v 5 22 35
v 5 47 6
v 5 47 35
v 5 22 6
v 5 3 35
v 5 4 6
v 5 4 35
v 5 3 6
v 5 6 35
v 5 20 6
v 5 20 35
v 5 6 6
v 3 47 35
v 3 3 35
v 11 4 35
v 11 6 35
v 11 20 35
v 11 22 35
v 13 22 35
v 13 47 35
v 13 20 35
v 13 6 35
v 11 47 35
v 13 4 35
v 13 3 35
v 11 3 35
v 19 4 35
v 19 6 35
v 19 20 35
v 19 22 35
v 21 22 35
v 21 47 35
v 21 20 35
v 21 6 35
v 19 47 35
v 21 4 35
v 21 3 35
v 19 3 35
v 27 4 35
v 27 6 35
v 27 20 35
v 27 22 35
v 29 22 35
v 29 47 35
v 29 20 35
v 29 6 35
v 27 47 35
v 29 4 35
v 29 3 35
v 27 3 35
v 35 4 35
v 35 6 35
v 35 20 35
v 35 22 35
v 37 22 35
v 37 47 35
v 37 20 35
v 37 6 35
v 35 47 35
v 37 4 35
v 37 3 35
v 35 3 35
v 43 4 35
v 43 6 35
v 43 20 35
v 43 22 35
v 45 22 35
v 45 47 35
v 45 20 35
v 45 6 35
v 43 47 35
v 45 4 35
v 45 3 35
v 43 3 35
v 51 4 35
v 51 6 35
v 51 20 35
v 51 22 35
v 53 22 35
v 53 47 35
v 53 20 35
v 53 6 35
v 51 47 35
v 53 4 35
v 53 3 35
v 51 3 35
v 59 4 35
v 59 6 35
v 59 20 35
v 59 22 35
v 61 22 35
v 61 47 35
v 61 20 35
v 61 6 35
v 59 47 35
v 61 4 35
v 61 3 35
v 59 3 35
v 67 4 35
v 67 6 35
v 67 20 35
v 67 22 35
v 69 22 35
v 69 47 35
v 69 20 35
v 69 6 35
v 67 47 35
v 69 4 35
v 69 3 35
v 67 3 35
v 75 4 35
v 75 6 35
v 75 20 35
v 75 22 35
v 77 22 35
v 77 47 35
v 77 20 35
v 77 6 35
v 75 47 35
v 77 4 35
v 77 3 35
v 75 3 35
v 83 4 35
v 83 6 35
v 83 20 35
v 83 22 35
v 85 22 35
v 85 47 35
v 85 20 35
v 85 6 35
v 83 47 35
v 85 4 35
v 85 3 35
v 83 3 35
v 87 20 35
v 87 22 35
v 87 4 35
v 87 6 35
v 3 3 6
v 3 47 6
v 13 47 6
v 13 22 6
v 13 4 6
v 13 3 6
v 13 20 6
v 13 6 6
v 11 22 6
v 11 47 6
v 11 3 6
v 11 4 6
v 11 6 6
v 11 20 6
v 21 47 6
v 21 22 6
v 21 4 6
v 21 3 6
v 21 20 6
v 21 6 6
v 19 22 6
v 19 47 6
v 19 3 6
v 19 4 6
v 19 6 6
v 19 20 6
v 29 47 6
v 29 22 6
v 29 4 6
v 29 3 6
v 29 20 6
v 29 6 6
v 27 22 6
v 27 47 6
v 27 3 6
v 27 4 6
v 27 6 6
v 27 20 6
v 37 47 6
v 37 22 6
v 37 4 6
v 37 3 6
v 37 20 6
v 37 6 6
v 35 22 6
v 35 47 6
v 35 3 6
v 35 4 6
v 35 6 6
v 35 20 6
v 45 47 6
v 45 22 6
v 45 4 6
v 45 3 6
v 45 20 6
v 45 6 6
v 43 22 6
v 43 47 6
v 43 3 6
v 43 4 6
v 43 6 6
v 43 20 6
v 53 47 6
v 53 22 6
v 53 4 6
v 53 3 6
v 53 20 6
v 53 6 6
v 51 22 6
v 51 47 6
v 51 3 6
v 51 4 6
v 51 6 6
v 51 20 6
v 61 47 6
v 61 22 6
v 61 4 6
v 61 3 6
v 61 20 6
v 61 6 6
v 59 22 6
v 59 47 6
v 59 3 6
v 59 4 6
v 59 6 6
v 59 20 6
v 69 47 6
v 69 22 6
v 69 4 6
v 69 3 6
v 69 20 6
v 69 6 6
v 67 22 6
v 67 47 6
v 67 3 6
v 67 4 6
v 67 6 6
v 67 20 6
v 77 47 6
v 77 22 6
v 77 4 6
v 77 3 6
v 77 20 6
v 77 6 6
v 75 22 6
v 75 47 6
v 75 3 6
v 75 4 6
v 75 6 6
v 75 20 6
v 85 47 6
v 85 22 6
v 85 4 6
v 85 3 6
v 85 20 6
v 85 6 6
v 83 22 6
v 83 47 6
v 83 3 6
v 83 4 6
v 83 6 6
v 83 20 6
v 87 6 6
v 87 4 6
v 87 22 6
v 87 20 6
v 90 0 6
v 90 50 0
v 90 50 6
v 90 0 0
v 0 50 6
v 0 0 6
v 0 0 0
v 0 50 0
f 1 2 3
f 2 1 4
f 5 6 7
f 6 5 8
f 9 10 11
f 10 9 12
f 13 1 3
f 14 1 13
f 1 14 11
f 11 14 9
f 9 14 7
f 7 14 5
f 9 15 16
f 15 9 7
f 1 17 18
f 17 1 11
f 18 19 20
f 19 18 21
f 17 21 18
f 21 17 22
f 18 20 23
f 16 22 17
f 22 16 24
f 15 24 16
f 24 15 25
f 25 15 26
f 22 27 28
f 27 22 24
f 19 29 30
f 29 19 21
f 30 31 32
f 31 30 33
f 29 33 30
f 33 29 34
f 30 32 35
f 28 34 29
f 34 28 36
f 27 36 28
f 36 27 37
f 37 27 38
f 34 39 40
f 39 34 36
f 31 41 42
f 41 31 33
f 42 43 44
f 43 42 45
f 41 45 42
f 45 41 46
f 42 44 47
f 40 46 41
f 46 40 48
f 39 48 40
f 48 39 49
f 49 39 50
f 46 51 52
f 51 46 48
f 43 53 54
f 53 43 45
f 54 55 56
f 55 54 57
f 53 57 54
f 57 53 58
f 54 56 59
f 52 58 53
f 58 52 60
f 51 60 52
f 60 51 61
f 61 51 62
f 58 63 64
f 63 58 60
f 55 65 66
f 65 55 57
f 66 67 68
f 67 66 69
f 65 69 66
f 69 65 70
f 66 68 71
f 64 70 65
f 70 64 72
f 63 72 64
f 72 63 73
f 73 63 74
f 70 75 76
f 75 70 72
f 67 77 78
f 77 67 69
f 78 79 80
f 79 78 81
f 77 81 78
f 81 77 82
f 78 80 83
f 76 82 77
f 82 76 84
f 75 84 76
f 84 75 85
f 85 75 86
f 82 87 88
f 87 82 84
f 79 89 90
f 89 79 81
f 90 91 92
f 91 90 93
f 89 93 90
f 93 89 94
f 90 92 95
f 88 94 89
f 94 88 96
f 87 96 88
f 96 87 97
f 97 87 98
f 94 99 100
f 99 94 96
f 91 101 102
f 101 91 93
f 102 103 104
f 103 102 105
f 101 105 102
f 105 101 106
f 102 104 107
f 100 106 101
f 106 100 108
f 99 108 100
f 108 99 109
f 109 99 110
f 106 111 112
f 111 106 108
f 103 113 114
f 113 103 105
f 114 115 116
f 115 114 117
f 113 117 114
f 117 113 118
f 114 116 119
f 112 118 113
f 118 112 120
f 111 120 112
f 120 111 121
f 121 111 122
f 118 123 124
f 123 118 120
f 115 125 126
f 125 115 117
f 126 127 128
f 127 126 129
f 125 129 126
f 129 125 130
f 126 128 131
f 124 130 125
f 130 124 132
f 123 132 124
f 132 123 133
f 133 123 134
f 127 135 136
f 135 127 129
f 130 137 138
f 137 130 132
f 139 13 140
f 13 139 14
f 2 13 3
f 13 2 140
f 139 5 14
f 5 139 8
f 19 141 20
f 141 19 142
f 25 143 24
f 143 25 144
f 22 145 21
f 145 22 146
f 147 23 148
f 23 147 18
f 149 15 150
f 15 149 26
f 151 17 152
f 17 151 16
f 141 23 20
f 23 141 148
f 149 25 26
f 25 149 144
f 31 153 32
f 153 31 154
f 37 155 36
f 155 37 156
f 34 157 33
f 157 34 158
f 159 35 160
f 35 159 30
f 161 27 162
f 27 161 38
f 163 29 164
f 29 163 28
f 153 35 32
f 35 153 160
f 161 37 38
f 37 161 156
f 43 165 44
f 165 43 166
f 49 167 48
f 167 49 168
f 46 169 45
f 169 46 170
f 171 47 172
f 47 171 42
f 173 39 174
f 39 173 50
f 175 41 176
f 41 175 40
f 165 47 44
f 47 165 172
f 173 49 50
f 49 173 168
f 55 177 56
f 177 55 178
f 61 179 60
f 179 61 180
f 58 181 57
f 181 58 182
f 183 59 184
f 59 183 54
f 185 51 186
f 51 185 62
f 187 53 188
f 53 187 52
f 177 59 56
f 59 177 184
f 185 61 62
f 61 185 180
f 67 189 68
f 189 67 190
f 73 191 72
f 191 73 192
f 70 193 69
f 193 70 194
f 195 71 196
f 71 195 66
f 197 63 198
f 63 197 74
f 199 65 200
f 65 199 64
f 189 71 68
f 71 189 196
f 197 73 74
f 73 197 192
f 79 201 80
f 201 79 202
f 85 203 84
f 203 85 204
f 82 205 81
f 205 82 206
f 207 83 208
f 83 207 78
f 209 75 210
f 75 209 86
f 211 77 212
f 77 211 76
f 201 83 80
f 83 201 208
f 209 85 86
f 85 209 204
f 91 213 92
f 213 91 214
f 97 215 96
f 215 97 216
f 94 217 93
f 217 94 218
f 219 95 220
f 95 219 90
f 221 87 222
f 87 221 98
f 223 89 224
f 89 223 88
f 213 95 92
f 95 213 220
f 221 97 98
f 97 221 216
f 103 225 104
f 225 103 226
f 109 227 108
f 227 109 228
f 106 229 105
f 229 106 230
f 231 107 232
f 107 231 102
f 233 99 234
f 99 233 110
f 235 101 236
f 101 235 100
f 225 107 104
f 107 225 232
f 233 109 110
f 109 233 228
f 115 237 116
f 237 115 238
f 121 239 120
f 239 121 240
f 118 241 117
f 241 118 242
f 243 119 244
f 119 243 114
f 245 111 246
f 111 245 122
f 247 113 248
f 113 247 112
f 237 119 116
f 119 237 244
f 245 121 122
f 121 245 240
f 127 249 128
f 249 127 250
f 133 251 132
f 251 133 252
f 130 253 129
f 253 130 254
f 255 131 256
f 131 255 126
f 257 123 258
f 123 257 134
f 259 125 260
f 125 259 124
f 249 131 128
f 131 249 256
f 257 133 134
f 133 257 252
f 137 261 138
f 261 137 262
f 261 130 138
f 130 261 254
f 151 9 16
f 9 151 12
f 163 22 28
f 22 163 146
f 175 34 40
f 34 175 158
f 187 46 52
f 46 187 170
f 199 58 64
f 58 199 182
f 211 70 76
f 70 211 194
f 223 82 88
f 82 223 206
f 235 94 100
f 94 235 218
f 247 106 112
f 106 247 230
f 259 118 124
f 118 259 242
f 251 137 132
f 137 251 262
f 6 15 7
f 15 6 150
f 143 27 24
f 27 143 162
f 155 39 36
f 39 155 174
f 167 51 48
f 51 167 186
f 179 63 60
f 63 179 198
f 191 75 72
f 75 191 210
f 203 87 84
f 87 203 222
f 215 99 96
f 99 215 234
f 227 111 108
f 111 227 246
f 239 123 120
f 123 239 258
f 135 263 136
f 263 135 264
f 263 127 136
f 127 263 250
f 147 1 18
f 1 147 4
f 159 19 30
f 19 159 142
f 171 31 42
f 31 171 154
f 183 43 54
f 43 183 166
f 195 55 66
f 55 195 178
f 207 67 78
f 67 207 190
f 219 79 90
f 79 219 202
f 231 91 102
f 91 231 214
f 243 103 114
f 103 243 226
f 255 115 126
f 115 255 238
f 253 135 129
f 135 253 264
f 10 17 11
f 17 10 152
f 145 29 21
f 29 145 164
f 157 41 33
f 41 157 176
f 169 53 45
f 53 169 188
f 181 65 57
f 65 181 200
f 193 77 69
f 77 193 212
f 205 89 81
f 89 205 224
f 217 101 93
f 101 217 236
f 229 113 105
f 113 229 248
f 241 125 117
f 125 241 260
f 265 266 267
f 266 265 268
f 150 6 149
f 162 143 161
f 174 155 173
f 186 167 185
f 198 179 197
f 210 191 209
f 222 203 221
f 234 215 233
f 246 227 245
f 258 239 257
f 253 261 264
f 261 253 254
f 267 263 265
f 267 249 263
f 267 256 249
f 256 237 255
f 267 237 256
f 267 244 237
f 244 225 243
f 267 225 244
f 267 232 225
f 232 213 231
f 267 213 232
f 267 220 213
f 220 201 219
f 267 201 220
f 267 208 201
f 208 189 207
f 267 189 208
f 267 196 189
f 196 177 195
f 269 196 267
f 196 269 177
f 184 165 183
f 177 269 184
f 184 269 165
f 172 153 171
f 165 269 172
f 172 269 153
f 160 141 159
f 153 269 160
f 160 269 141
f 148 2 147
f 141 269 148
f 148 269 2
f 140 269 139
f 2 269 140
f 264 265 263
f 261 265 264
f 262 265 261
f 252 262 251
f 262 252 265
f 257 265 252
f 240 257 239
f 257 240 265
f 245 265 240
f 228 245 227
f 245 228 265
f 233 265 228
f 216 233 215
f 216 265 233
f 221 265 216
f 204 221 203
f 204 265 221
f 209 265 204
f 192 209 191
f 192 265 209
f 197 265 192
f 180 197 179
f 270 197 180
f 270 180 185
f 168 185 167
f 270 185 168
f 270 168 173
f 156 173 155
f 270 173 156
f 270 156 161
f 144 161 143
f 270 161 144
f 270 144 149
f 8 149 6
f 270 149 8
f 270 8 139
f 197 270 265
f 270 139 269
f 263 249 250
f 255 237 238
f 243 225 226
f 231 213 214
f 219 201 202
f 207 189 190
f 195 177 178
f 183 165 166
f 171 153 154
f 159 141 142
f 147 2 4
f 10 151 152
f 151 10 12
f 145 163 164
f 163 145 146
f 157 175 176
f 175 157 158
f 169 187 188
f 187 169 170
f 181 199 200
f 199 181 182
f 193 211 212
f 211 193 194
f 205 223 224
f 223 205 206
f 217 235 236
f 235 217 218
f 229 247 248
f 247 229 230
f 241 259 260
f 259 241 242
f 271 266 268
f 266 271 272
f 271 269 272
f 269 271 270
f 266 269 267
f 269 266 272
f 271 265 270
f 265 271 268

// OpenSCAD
$fn = 32;

// ----------------------------------------------------------------------
// Heatsink: cross fin block
// ----------------------------------------------------------------------

// --- parameters (mm) ---
base_l = 90;              // base length, X
base_w = 50;              // base width, Y
base_t = 6;               // base plate thickness
fin_h = 30;               // fin height above the base
fin_t = 2;                // fin thickness
edge = 3;                 // margin from the base ends
pitch = 8;                // fin pitch
rib_pitch = 16;           // cross rib pitch

n_fins = floor((base_l - 2 * edge - fin_t) / pitch) + 1;  // fin count
total_h = base_t + fin_h - 1;  // overall height
n_ribs = floor((base_w - 2 * edge) / rib_pitch);  // rib count

union() {
  cube([base_l, base_w, base_t]);
  for (i = [0 : n_fins - 1])
    translate([edge + i * pitch, edge, base_t - 1])
      cube([fin_t, base_w - 2 * edge, fin_h]);
  for (i = [0 : n_ribs - 1])
    translate([edge, edge + 1 + i * rib_pitch, base_t - 1])
      cube([base_l - 2 * edge, fin_t, fin_h]);
}
